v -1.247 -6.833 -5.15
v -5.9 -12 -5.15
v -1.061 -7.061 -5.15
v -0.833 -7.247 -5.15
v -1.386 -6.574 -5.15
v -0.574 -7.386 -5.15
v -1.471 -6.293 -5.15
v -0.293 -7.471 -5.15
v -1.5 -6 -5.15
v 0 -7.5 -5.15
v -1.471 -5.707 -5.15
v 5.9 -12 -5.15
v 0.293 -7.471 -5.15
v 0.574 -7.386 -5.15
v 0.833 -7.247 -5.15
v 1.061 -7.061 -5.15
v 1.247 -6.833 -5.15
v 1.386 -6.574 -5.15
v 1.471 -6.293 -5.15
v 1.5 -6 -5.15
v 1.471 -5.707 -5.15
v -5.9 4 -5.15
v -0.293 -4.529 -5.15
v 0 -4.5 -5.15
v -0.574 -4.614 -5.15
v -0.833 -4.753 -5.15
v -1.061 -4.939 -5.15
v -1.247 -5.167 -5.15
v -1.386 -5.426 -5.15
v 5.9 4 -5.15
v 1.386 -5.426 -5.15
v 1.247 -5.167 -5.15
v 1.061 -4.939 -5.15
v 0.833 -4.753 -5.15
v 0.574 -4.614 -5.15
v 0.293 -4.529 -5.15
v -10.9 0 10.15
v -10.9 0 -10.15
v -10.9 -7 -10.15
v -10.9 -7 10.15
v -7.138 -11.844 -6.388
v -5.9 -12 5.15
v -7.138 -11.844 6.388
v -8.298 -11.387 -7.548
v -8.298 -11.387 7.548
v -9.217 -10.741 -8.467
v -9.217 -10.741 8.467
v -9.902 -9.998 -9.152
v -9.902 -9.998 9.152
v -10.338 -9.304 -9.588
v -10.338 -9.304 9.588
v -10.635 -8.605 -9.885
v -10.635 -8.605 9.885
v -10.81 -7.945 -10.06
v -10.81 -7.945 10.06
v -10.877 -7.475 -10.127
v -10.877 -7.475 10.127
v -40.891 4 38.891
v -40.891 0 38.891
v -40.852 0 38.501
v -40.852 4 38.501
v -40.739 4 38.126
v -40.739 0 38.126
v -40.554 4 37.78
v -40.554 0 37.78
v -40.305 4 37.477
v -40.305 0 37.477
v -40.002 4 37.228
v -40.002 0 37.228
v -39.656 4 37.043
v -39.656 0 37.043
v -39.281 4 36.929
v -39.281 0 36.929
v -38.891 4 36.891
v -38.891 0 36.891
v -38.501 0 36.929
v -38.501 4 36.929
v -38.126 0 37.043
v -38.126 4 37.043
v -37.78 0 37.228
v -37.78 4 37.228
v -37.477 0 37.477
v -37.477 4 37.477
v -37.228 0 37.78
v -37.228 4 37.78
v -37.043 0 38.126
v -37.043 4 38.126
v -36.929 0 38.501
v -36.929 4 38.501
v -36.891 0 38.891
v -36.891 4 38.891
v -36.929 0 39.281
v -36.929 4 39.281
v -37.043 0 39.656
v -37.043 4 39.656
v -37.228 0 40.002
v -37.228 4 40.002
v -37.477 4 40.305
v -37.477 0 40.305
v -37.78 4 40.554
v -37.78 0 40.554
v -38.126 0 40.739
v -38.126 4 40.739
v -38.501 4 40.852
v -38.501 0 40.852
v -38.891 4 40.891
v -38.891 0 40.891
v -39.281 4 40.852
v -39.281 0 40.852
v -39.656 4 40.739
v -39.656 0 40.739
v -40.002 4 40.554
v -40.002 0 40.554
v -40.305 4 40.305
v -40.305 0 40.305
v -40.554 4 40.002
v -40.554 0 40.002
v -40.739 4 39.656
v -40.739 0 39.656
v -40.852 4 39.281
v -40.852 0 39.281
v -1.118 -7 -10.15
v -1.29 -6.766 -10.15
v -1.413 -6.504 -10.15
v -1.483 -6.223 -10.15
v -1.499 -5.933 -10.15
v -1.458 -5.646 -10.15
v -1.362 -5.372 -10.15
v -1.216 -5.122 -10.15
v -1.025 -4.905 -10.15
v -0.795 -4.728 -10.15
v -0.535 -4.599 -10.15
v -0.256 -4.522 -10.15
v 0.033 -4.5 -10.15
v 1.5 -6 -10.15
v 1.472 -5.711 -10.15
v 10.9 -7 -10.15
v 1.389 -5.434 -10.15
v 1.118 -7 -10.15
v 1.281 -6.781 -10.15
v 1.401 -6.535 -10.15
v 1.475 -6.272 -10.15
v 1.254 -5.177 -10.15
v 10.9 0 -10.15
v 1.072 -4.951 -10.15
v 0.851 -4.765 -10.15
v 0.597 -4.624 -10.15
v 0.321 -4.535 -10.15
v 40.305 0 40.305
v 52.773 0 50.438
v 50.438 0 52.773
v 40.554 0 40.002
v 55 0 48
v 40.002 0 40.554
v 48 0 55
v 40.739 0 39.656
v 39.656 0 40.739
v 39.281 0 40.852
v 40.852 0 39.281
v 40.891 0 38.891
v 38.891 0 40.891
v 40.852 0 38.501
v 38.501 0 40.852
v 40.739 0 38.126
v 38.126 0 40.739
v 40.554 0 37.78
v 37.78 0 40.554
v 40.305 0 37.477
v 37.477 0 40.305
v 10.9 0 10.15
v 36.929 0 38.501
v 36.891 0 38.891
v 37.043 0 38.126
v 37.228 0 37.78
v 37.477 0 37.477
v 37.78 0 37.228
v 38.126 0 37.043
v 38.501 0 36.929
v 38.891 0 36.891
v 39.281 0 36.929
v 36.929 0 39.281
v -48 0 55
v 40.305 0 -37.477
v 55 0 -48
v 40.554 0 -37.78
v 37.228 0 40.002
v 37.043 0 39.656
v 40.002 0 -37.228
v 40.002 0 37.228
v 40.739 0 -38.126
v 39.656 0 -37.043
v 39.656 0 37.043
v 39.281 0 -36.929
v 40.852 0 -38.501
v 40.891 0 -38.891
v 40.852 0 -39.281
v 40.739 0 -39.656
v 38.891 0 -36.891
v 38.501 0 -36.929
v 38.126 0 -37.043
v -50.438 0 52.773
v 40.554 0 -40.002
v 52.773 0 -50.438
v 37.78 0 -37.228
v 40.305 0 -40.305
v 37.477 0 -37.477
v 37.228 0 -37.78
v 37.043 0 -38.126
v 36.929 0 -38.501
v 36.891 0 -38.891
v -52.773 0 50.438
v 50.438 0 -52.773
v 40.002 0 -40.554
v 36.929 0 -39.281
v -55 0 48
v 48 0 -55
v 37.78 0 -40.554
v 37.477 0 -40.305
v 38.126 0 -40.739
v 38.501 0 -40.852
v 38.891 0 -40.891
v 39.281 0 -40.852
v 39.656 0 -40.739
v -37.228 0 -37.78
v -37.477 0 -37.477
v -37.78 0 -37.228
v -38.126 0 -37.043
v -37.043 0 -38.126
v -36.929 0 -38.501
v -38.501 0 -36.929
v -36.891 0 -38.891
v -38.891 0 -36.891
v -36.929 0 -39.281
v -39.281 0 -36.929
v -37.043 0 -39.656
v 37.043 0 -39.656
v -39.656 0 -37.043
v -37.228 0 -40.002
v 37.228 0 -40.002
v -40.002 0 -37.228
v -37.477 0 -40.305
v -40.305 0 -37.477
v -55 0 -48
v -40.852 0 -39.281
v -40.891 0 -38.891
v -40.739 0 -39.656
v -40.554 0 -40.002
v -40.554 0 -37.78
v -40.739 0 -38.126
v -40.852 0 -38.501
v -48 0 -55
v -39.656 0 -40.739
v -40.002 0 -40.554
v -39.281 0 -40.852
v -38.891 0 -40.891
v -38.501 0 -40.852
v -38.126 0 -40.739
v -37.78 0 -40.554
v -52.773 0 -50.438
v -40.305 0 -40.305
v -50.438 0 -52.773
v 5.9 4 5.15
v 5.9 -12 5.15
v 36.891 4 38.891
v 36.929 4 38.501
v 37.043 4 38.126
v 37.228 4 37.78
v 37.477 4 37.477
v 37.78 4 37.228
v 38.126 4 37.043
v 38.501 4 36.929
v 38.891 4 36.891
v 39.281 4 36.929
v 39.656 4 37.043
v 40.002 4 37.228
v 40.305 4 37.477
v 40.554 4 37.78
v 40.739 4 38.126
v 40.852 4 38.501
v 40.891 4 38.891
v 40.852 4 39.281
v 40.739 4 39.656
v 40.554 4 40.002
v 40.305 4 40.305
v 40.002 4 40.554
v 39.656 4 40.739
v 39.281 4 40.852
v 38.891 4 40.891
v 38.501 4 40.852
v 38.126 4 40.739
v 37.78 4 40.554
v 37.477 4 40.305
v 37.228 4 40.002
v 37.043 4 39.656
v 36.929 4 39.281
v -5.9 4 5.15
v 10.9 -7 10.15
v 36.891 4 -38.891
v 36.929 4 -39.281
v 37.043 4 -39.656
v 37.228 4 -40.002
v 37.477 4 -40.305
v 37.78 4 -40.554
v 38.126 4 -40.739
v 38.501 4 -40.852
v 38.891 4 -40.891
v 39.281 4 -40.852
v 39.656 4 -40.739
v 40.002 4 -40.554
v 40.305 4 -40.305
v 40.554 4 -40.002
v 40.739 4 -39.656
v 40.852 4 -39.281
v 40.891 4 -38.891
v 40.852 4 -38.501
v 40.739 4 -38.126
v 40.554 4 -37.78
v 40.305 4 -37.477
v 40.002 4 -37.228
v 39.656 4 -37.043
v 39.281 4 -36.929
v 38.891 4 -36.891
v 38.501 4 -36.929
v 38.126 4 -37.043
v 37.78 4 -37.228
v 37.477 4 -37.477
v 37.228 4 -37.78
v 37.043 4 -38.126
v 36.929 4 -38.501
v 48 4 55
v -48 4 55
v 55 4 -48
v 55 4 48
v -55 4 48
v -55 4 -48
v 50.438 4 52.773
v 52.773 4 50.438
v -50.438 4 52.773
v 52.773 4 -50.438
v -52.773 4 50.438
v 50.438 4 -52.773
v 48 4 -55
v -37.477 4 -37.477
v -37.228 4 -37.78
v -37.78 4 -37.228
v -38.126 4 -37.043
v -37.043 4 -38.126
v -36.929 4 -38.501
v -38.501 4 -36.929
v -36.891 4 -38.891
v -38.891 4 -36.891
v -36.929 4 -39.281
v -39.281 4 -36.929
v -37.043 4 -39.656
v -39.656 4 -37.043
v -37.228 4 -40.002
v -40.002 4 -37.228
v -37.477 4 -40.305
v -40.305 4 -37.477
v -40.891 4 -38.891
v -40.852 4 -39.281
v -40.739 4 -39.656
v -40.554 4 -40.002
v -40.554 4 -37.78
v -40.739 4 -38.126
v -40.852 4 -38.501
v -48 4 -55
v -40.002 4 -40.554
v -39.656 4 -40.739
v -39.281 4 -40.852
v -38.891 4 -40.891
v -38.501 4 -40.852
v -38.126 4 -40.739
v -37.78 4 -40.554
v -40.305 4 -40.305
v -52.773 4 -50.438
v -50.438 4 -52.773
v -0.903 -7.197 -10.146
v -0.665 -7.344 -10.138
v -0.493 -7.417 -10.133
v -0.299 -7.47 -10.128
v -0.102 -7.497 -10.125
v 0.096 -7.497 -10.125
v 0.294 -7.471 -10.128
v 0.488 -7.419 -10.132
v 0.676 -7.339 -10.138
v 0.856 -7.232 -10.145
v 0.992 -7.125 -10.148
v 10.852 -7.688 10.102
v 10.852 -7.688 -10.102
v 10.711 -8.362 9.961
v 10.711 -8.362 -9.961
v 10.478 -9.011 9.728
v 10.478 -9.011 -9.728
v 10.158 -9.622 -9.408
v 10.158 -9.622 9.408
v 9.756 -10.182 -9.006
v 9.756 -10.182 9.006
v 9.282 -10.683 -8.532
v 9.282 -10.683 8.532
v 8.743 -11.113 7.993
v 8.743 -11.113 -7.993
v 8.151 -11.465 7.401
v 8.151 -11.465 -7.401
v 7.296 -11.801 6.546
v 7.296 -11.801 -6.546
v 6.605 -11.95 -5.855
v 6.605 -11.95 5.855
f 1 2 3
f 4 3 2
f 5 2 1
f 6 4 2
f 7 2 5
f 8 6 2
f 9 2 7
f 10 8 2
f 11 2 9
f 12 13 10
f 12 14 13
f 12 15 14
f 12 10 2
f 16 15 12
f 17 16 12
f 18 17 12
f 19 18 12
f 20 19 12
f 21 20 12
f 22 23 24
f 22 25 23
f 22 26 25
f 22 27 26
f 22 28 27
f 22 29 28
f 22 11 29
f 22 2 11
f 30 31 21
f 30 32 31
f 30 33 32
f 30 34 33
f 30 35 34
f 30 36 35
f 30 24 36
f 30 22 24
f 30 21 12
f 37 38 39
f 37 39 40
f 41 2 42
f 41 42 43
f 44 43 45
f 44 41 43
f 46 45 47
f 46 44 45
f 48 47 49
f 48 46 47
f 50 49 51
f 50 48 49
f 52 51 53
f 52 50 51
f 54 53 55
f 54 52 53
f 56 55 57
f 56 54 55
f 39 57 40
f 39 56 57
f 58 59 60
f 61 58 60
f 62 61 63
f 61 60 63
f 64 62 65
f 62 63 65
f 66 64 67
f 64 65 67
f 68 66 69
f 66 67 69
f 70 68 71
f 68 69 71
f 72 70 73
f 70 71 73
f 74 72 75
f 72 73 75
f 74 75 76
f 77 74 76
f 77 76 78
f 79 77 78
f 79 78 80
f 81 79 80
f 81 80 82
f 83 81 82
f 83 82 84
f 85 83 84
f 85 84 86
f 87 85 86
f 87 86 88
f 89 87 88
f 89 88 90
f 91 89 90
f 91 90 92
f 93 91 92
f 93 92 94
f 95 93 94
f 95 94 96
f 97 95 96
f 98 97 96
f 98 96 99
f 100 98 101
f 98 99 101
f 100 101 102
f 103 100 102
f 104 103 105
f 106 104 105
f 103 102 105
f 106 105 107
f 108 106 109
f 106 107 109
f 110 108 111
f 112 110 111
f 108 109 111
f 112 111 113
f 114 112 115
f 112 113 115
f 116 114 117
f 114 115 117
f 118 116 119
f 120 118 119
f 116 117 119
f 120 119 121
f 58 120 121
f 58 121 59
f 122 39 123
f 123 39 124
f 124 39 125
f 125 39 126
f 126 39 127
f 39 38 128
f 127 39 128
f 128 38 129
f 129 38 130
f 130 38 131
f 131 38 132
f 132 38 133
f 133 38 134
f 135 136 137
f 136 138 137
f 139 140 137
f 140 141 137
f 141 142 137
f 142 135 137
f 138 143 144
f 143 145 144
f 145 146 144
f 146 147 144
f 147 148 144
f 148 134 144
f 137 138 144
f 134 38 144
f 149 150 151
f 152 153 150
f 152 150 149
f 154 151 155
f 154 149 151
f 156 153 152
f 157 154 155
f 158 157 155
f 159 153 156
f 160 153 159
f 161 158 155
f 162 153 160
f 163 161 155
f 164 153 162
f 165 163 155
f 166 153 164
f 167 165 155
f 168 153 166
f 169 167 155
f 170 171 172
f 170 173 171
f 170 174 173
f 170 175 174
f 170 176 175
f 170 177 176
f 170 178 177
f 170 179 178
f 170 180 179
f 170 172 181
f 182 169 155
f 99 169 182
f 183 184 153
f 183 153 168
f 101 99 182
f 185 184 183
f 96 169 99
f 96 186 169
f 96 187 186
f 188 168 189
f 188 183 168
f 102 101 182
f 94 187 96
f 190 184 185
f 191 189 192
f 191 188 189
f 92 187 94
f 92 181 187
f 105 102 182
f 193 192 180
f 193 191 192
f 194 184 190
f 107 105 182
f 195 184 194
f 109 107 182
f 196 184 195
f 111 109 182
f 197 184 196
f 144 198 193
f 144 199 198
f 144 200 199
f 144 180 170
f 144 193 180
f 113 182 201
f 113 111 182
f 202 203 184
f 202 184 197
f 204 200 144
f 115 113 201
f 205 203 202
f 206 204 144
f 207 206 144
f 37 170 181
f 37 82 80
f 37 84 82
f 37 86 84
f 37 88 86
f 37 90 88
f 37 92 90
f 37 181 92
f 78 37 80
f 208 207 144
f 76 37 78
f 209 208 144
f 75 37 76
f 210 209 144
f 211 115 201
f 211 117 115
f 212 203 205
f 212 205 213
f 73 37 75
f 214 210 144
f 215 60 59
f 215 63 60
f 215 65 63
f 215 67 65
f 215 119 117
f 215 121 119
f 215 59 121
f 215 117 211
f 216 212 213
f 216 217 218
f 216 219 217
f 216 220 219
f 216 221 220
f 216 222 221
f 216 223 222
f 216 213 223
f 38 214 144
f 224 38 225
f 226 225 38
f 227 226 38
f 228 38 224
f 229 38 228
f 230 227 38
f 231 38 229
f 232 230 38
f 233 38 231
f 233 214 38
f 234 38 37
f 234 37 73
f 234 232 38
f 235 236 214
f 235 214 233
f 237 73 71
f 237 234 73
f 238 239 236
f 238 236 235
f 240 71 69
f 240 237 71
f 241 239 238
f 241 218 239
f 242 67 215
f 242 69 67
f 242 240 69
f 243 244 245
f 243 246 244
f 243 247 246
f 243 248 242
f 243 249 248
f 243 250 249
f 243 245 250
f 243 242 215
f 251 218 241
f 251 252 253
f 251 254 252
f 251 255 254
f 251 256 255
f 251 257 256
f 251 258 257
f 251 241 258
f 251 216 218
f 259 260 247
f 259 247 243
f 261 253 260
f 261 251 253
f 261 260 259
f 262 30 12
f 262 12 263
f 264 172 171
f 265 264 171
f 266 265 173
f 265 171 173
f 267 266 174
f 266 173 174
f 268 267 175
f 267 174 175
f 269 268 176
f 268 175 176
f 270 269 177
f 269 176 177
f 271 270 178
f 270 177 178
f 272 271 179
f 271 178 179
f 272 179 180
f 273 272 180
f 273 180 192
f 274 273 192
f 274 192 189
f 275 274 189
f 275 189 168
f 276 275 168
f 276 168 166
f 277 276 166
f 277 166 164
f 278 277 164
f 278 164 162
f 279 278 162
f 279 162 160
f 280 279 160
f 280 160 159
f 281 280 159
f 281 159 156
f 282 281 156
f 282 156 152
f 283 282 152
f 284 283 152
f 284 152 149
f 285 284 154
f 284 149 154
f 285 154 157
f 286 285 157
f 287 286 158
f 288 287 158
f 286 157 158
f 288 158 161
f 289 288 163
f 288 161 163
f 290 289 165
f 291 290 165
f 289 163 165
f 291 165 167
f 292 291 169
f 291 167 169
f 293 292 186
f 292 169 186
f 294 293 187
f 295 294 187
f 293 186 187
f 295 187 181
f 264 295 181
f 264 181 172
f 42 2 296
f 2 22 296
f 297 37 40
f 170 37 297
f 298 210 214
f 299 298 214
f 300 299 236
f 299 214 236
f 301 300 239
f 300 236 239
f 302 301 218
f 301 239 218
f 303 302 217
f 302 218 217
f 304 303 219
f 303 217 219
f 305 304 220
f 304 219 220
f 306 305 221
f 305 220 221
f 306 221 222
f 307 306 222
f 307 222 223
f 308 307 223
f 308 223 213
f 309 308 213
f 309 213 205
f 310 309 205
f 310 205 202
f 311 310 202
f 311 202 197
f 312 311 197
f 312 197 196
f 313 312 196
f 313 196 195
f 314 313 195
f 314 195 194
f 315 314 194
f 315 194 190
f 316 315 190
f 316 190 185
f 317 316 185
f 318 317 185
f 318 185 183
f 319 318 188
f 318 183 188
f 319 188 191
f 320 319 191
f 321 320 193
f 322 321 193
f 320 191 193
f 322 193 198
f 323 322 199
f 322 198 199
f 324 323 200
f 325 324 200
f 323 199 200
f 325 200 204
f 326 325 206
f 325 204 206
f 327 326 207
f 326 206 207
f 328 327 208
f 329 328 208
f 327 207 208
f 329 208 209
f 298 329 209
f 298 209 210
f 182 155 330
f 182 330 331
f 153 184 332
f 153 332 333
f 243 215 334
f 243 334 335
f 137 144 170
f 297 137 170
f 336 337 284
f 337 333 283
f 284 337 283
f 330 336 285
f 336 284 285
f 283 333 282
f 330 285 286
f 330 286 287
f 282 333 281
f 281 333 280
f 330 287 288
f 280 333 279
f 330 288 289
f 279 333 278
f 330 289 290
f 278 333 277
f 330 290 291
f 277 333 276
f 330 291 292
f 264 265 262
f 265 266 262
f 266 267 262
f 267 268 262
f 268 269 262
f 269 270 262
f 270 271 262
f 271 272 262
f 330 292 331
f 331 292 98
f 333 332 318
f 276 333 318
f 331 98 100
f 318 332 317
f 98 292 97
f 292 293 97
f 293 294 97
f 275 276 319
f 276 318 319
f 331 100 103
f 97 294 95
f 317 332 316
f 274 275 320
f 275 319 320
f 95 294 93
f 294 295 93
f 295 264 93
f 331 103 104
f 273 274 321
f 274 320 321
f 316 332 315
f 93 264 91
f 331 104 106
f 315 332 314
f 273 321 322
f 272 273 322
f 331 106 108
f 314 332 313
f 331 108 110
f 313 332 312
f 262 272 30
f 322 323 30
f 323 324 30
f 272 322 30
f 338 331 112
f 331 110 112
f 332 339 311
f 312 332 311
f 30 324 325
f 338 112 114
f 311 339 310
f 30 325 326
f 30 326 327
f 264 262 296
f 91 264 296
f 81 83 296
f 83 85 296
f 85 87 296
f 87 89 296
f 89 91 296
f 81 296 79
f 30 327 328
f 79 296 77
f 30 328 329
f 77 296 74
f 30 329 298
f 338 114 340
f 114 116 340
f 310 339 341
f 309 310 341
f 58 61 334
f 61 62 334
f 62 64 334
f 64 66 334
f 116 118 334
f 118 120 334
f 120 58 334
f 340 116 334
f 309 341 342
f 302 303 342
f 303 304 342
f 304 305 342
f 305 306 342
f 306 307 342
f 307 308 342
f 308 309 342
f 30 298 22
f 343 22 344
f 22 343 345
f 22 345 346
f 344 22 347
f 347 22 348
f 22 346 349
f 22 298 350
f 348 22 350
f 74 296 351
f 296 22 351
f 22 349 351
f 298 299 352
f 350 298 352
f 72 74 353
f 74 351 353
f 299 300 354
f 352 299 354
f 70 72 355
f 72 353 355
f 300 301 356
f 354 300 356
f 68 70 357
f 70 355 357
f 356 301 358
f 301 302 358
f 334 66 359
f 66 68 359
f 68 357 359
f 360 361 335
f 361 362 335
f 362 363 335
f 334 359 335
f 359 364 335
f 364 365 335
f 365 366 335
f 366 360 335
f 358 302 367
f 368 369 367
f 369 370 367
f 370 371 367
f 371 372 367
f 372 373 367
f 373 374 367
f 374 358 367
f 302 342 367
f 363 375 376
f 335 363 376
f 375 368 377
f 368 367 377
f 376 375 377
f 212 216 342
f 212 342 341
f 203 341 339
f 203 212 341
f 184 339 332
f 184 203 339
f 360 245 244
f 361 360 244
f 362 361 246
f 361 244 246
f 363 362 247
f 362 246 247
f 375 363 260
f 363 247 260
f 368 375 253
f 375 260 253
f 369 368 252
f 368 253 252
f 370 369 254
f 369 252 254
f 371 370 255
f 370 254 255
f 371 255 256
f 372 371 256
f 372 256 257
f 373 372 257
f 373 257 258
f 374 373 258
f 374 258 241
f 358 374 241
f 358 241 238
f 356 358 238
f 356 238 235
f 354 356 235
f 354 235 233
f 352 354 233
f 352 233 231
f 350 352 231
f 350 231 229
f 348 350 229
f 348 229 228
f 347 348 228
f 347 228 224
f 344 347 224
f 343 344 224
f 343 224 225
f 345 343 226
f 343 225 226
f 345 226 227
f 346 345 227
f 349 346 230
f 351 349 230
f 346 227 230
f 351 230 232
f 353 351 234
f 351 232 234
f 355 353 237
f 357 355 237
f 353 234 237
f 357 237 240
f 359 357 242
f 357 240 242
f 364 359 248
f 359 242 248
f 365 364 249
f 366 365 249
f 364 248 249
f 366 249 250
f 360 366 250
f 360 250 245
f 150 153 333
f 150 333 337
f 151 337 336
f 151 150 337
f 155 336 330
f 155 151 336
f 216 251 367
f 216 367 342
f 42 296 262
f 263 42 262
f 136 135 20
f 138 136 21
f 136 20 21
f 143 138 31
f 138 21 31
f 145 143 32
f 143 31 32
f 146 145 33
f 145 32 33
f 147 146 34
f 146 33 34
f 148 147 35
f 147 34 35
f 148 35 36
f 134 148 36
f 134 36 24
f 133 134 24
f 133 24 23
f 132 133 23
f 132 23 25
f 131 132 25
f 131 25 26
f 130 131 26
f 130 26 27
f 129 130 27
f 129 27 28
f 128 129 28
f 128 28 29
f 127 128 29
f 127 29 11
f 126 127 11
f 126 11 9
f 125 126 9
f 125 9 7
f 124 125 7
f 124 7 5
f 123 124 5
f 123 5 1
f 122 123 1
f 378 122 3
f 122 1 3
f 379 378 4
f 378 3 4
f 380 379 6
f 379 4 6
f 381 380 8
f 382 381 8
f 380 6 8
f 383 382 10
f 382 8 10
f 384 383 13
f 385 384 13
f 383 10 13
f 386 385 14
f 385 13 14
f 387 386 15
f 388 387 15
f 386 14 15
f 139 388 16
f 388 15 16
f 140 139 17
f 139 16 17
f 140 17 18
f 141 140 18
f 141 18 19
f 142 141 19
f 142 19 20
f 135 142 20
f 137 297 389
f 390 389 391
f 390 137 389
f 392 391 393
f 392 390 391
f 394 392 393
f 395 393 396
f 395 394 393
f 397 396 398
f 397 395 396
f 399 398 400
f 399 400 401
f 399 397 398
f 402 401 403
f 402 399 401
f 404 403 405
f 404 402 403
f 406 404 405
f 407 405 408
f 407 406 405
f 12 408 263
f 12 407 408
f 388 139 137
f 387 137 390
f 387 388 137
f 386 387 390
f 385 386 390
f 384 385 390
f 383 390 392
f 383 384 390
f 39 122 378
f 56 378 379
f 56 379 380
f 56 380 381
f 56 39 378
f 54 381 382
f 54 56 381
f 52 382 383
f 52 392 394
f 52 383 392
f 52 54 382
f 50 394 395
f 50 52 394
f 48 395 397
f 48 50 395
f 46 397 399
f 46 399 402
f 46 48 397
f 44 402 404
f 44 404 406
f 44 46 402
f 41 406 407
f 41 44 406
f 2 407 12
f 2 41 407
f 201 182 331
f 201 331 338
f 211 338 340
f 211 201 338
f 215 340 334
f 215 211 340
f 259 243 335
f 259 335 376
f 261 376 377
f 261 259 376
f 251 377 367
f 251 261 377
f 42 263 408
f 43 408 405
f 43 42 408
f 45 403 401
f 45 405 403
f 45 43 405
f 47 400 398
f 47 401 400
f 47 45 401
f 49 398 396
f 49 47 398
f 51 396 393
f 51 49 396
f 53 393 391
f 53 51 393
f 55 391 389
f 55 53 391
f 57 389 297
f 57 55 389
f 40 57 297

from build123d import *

# Parameters (mm, degrees)
BOSS_EXTRUDE1_DEPTH       = 4
F_4_0MM_DOWEL_HOLE2_D     = 4
SKETCH7_W                 = 11.8
SKETCH7_H                 = 10.3
CUT_EXTRUDE1_DEPTH        = 10
SKETCH8_W                 = 21.8
SKETCH8_H                 = 20.3
SKETCH8_W_2               = 11.8
SKETCH8_H_2               = 10.3
BOSS_EXTRUDE2_DEPTH       = 12
FILLET1_START             = -10.15
FILLET1_DEPTH             = 20.3
FILLET1_START_2           = -12
FILLET1_2_DEPTH           = 24
F_3_0MM_DOWEL_HOLE1_D     = 3
F_3_0MM_DOWEL_HOLE1_DEPTH = 5


with BuildPart() as part:
    # Sketch1 → Boss-Extrude1 (new body)
    with BuildSketch(Plane(origin=(0, 0, 0), x_dir=(1, 0, 0), z_dir=(0, 1, 0))):
        with BuildLine():
            Line((55, 48), (55, -48))
            ThreePointArc((55, -48), (51.618795027, -51.618795027), (48, -55))
            Line((48, -55), (-48, -55))
            ThreePointArc((-48, -55), (-51.618795027, -51.618795027), (-55, -48))
            Line((-55, -48), (-55, 48))
            ThreePointArc((-55, 48), (-51.618795027, 51.618795027), (-48, 55))
            Line((-48, 55), (48, 55))
            ThreePointArc((48, 55), (51.618795027, 51.618795027), (55, 48))
        make_face()
    extrude(amount=BOSS_EXTRUDE1_DEPTH)

    # Ø4.0mm Dowel Hole2 (through all)
    with Locations(Plane(origin=(0, 4, 0), x_dir=(1, 0, 0), z_dir=(0, 1, 0))):
        with Locations((38.890872965, 38.890872965), (38.890872965, -38.890872965), (-38.890872965, -38.890872965), (-38.890872965, 38.890872965)):
            Hole(F_4_0MM_DOWEL_HOLE2_D / 2)

    # Sketch7 → Cut-Extrude1 (cut)
    with BuildSketch(Plane.XZ):
        Rectangle(SKETCH7_W, SKETCH7_H)
    extrude(amount=-CUT_EXTRUDE1_DEPTH, mode=Mode.SUBTRACT)

    # Sketch8 → Boss-Extrude2 (add)
    with BuildSketch(Plane.XZ):
        Rectangle(SKETCH8_W, SKETCH8_H)
        Rectangle(SKETCH8_W_2, SKETCH8_H_2, mode=Mode.SUBTRACT)
    extrude(amount=BOSS_EXTRUDE2_DEPTH)

    # Fillet1: read off the stored shape, not the designer's step
    # Fillet1 outline → Fillet1 (cut)
    with BuildSketch(Plane.XY.offset(FILLET1_START)):
        with BuildLine():
            Line((10.9, -12), (10.9, -7))
            ThreePointArc((10.9, -7), (9.435533906, -10.535533906), (5.9, -12))
            Line((5.9, -12), (10.9, -12))
        make_face()
        with BuildLine():
            Line((-10.9, -12), (-5.9, -12))
            ThreePointArc((-5.9, -12), (-9.435533906, -10.535533906), (-10.9, -7))
            Line((-10.9, -7), (-10.9, -12))
        make_face()
    extrude(amount=FILLET1_DEPTH, mode=Mode.SUBTRACT)

    # Fillet1 2 outline → Fillet1 2 (cut)
    with BuildSketch(Plane.YZ.offset(FILLET1_START_2)):
        with BuildLine():
            ThreePointArc((-12, 5.15), (-10.535533906, 8.685533906), (-7, 10.15))
            Line((-7, 10.15), (-12, 10.15))
            Line((-12, 10.15), (-12, 5.15))
        make_face()
        with BuildLine():
            Line((-12, -10.15), (-7, -10.15))
            ThreePointArc((-7, -10.15), (-10.535533906, -8.685533906), (-12, -5.15))
            Line((-12, -5.15), (-12, -10.15))
        make_face()
    extrude(amount=FILLET1_2_DEPTH, mode=Mode.SUBTRACT)

    # Ø3.0mm Dowel Hole1
    with Locations(Plane(origin=(0, 0, -10.15), x_dir=(-1, 0, 0), z_dir=(0, 0, -1))):
        with Locations((0, -6)):
            Hole(F_3_0MM_DOWEL_HOLE1_D / 2, depth=F_3_0MM_DOWEL_HOLE1_DEPTH)


solid = part.part
